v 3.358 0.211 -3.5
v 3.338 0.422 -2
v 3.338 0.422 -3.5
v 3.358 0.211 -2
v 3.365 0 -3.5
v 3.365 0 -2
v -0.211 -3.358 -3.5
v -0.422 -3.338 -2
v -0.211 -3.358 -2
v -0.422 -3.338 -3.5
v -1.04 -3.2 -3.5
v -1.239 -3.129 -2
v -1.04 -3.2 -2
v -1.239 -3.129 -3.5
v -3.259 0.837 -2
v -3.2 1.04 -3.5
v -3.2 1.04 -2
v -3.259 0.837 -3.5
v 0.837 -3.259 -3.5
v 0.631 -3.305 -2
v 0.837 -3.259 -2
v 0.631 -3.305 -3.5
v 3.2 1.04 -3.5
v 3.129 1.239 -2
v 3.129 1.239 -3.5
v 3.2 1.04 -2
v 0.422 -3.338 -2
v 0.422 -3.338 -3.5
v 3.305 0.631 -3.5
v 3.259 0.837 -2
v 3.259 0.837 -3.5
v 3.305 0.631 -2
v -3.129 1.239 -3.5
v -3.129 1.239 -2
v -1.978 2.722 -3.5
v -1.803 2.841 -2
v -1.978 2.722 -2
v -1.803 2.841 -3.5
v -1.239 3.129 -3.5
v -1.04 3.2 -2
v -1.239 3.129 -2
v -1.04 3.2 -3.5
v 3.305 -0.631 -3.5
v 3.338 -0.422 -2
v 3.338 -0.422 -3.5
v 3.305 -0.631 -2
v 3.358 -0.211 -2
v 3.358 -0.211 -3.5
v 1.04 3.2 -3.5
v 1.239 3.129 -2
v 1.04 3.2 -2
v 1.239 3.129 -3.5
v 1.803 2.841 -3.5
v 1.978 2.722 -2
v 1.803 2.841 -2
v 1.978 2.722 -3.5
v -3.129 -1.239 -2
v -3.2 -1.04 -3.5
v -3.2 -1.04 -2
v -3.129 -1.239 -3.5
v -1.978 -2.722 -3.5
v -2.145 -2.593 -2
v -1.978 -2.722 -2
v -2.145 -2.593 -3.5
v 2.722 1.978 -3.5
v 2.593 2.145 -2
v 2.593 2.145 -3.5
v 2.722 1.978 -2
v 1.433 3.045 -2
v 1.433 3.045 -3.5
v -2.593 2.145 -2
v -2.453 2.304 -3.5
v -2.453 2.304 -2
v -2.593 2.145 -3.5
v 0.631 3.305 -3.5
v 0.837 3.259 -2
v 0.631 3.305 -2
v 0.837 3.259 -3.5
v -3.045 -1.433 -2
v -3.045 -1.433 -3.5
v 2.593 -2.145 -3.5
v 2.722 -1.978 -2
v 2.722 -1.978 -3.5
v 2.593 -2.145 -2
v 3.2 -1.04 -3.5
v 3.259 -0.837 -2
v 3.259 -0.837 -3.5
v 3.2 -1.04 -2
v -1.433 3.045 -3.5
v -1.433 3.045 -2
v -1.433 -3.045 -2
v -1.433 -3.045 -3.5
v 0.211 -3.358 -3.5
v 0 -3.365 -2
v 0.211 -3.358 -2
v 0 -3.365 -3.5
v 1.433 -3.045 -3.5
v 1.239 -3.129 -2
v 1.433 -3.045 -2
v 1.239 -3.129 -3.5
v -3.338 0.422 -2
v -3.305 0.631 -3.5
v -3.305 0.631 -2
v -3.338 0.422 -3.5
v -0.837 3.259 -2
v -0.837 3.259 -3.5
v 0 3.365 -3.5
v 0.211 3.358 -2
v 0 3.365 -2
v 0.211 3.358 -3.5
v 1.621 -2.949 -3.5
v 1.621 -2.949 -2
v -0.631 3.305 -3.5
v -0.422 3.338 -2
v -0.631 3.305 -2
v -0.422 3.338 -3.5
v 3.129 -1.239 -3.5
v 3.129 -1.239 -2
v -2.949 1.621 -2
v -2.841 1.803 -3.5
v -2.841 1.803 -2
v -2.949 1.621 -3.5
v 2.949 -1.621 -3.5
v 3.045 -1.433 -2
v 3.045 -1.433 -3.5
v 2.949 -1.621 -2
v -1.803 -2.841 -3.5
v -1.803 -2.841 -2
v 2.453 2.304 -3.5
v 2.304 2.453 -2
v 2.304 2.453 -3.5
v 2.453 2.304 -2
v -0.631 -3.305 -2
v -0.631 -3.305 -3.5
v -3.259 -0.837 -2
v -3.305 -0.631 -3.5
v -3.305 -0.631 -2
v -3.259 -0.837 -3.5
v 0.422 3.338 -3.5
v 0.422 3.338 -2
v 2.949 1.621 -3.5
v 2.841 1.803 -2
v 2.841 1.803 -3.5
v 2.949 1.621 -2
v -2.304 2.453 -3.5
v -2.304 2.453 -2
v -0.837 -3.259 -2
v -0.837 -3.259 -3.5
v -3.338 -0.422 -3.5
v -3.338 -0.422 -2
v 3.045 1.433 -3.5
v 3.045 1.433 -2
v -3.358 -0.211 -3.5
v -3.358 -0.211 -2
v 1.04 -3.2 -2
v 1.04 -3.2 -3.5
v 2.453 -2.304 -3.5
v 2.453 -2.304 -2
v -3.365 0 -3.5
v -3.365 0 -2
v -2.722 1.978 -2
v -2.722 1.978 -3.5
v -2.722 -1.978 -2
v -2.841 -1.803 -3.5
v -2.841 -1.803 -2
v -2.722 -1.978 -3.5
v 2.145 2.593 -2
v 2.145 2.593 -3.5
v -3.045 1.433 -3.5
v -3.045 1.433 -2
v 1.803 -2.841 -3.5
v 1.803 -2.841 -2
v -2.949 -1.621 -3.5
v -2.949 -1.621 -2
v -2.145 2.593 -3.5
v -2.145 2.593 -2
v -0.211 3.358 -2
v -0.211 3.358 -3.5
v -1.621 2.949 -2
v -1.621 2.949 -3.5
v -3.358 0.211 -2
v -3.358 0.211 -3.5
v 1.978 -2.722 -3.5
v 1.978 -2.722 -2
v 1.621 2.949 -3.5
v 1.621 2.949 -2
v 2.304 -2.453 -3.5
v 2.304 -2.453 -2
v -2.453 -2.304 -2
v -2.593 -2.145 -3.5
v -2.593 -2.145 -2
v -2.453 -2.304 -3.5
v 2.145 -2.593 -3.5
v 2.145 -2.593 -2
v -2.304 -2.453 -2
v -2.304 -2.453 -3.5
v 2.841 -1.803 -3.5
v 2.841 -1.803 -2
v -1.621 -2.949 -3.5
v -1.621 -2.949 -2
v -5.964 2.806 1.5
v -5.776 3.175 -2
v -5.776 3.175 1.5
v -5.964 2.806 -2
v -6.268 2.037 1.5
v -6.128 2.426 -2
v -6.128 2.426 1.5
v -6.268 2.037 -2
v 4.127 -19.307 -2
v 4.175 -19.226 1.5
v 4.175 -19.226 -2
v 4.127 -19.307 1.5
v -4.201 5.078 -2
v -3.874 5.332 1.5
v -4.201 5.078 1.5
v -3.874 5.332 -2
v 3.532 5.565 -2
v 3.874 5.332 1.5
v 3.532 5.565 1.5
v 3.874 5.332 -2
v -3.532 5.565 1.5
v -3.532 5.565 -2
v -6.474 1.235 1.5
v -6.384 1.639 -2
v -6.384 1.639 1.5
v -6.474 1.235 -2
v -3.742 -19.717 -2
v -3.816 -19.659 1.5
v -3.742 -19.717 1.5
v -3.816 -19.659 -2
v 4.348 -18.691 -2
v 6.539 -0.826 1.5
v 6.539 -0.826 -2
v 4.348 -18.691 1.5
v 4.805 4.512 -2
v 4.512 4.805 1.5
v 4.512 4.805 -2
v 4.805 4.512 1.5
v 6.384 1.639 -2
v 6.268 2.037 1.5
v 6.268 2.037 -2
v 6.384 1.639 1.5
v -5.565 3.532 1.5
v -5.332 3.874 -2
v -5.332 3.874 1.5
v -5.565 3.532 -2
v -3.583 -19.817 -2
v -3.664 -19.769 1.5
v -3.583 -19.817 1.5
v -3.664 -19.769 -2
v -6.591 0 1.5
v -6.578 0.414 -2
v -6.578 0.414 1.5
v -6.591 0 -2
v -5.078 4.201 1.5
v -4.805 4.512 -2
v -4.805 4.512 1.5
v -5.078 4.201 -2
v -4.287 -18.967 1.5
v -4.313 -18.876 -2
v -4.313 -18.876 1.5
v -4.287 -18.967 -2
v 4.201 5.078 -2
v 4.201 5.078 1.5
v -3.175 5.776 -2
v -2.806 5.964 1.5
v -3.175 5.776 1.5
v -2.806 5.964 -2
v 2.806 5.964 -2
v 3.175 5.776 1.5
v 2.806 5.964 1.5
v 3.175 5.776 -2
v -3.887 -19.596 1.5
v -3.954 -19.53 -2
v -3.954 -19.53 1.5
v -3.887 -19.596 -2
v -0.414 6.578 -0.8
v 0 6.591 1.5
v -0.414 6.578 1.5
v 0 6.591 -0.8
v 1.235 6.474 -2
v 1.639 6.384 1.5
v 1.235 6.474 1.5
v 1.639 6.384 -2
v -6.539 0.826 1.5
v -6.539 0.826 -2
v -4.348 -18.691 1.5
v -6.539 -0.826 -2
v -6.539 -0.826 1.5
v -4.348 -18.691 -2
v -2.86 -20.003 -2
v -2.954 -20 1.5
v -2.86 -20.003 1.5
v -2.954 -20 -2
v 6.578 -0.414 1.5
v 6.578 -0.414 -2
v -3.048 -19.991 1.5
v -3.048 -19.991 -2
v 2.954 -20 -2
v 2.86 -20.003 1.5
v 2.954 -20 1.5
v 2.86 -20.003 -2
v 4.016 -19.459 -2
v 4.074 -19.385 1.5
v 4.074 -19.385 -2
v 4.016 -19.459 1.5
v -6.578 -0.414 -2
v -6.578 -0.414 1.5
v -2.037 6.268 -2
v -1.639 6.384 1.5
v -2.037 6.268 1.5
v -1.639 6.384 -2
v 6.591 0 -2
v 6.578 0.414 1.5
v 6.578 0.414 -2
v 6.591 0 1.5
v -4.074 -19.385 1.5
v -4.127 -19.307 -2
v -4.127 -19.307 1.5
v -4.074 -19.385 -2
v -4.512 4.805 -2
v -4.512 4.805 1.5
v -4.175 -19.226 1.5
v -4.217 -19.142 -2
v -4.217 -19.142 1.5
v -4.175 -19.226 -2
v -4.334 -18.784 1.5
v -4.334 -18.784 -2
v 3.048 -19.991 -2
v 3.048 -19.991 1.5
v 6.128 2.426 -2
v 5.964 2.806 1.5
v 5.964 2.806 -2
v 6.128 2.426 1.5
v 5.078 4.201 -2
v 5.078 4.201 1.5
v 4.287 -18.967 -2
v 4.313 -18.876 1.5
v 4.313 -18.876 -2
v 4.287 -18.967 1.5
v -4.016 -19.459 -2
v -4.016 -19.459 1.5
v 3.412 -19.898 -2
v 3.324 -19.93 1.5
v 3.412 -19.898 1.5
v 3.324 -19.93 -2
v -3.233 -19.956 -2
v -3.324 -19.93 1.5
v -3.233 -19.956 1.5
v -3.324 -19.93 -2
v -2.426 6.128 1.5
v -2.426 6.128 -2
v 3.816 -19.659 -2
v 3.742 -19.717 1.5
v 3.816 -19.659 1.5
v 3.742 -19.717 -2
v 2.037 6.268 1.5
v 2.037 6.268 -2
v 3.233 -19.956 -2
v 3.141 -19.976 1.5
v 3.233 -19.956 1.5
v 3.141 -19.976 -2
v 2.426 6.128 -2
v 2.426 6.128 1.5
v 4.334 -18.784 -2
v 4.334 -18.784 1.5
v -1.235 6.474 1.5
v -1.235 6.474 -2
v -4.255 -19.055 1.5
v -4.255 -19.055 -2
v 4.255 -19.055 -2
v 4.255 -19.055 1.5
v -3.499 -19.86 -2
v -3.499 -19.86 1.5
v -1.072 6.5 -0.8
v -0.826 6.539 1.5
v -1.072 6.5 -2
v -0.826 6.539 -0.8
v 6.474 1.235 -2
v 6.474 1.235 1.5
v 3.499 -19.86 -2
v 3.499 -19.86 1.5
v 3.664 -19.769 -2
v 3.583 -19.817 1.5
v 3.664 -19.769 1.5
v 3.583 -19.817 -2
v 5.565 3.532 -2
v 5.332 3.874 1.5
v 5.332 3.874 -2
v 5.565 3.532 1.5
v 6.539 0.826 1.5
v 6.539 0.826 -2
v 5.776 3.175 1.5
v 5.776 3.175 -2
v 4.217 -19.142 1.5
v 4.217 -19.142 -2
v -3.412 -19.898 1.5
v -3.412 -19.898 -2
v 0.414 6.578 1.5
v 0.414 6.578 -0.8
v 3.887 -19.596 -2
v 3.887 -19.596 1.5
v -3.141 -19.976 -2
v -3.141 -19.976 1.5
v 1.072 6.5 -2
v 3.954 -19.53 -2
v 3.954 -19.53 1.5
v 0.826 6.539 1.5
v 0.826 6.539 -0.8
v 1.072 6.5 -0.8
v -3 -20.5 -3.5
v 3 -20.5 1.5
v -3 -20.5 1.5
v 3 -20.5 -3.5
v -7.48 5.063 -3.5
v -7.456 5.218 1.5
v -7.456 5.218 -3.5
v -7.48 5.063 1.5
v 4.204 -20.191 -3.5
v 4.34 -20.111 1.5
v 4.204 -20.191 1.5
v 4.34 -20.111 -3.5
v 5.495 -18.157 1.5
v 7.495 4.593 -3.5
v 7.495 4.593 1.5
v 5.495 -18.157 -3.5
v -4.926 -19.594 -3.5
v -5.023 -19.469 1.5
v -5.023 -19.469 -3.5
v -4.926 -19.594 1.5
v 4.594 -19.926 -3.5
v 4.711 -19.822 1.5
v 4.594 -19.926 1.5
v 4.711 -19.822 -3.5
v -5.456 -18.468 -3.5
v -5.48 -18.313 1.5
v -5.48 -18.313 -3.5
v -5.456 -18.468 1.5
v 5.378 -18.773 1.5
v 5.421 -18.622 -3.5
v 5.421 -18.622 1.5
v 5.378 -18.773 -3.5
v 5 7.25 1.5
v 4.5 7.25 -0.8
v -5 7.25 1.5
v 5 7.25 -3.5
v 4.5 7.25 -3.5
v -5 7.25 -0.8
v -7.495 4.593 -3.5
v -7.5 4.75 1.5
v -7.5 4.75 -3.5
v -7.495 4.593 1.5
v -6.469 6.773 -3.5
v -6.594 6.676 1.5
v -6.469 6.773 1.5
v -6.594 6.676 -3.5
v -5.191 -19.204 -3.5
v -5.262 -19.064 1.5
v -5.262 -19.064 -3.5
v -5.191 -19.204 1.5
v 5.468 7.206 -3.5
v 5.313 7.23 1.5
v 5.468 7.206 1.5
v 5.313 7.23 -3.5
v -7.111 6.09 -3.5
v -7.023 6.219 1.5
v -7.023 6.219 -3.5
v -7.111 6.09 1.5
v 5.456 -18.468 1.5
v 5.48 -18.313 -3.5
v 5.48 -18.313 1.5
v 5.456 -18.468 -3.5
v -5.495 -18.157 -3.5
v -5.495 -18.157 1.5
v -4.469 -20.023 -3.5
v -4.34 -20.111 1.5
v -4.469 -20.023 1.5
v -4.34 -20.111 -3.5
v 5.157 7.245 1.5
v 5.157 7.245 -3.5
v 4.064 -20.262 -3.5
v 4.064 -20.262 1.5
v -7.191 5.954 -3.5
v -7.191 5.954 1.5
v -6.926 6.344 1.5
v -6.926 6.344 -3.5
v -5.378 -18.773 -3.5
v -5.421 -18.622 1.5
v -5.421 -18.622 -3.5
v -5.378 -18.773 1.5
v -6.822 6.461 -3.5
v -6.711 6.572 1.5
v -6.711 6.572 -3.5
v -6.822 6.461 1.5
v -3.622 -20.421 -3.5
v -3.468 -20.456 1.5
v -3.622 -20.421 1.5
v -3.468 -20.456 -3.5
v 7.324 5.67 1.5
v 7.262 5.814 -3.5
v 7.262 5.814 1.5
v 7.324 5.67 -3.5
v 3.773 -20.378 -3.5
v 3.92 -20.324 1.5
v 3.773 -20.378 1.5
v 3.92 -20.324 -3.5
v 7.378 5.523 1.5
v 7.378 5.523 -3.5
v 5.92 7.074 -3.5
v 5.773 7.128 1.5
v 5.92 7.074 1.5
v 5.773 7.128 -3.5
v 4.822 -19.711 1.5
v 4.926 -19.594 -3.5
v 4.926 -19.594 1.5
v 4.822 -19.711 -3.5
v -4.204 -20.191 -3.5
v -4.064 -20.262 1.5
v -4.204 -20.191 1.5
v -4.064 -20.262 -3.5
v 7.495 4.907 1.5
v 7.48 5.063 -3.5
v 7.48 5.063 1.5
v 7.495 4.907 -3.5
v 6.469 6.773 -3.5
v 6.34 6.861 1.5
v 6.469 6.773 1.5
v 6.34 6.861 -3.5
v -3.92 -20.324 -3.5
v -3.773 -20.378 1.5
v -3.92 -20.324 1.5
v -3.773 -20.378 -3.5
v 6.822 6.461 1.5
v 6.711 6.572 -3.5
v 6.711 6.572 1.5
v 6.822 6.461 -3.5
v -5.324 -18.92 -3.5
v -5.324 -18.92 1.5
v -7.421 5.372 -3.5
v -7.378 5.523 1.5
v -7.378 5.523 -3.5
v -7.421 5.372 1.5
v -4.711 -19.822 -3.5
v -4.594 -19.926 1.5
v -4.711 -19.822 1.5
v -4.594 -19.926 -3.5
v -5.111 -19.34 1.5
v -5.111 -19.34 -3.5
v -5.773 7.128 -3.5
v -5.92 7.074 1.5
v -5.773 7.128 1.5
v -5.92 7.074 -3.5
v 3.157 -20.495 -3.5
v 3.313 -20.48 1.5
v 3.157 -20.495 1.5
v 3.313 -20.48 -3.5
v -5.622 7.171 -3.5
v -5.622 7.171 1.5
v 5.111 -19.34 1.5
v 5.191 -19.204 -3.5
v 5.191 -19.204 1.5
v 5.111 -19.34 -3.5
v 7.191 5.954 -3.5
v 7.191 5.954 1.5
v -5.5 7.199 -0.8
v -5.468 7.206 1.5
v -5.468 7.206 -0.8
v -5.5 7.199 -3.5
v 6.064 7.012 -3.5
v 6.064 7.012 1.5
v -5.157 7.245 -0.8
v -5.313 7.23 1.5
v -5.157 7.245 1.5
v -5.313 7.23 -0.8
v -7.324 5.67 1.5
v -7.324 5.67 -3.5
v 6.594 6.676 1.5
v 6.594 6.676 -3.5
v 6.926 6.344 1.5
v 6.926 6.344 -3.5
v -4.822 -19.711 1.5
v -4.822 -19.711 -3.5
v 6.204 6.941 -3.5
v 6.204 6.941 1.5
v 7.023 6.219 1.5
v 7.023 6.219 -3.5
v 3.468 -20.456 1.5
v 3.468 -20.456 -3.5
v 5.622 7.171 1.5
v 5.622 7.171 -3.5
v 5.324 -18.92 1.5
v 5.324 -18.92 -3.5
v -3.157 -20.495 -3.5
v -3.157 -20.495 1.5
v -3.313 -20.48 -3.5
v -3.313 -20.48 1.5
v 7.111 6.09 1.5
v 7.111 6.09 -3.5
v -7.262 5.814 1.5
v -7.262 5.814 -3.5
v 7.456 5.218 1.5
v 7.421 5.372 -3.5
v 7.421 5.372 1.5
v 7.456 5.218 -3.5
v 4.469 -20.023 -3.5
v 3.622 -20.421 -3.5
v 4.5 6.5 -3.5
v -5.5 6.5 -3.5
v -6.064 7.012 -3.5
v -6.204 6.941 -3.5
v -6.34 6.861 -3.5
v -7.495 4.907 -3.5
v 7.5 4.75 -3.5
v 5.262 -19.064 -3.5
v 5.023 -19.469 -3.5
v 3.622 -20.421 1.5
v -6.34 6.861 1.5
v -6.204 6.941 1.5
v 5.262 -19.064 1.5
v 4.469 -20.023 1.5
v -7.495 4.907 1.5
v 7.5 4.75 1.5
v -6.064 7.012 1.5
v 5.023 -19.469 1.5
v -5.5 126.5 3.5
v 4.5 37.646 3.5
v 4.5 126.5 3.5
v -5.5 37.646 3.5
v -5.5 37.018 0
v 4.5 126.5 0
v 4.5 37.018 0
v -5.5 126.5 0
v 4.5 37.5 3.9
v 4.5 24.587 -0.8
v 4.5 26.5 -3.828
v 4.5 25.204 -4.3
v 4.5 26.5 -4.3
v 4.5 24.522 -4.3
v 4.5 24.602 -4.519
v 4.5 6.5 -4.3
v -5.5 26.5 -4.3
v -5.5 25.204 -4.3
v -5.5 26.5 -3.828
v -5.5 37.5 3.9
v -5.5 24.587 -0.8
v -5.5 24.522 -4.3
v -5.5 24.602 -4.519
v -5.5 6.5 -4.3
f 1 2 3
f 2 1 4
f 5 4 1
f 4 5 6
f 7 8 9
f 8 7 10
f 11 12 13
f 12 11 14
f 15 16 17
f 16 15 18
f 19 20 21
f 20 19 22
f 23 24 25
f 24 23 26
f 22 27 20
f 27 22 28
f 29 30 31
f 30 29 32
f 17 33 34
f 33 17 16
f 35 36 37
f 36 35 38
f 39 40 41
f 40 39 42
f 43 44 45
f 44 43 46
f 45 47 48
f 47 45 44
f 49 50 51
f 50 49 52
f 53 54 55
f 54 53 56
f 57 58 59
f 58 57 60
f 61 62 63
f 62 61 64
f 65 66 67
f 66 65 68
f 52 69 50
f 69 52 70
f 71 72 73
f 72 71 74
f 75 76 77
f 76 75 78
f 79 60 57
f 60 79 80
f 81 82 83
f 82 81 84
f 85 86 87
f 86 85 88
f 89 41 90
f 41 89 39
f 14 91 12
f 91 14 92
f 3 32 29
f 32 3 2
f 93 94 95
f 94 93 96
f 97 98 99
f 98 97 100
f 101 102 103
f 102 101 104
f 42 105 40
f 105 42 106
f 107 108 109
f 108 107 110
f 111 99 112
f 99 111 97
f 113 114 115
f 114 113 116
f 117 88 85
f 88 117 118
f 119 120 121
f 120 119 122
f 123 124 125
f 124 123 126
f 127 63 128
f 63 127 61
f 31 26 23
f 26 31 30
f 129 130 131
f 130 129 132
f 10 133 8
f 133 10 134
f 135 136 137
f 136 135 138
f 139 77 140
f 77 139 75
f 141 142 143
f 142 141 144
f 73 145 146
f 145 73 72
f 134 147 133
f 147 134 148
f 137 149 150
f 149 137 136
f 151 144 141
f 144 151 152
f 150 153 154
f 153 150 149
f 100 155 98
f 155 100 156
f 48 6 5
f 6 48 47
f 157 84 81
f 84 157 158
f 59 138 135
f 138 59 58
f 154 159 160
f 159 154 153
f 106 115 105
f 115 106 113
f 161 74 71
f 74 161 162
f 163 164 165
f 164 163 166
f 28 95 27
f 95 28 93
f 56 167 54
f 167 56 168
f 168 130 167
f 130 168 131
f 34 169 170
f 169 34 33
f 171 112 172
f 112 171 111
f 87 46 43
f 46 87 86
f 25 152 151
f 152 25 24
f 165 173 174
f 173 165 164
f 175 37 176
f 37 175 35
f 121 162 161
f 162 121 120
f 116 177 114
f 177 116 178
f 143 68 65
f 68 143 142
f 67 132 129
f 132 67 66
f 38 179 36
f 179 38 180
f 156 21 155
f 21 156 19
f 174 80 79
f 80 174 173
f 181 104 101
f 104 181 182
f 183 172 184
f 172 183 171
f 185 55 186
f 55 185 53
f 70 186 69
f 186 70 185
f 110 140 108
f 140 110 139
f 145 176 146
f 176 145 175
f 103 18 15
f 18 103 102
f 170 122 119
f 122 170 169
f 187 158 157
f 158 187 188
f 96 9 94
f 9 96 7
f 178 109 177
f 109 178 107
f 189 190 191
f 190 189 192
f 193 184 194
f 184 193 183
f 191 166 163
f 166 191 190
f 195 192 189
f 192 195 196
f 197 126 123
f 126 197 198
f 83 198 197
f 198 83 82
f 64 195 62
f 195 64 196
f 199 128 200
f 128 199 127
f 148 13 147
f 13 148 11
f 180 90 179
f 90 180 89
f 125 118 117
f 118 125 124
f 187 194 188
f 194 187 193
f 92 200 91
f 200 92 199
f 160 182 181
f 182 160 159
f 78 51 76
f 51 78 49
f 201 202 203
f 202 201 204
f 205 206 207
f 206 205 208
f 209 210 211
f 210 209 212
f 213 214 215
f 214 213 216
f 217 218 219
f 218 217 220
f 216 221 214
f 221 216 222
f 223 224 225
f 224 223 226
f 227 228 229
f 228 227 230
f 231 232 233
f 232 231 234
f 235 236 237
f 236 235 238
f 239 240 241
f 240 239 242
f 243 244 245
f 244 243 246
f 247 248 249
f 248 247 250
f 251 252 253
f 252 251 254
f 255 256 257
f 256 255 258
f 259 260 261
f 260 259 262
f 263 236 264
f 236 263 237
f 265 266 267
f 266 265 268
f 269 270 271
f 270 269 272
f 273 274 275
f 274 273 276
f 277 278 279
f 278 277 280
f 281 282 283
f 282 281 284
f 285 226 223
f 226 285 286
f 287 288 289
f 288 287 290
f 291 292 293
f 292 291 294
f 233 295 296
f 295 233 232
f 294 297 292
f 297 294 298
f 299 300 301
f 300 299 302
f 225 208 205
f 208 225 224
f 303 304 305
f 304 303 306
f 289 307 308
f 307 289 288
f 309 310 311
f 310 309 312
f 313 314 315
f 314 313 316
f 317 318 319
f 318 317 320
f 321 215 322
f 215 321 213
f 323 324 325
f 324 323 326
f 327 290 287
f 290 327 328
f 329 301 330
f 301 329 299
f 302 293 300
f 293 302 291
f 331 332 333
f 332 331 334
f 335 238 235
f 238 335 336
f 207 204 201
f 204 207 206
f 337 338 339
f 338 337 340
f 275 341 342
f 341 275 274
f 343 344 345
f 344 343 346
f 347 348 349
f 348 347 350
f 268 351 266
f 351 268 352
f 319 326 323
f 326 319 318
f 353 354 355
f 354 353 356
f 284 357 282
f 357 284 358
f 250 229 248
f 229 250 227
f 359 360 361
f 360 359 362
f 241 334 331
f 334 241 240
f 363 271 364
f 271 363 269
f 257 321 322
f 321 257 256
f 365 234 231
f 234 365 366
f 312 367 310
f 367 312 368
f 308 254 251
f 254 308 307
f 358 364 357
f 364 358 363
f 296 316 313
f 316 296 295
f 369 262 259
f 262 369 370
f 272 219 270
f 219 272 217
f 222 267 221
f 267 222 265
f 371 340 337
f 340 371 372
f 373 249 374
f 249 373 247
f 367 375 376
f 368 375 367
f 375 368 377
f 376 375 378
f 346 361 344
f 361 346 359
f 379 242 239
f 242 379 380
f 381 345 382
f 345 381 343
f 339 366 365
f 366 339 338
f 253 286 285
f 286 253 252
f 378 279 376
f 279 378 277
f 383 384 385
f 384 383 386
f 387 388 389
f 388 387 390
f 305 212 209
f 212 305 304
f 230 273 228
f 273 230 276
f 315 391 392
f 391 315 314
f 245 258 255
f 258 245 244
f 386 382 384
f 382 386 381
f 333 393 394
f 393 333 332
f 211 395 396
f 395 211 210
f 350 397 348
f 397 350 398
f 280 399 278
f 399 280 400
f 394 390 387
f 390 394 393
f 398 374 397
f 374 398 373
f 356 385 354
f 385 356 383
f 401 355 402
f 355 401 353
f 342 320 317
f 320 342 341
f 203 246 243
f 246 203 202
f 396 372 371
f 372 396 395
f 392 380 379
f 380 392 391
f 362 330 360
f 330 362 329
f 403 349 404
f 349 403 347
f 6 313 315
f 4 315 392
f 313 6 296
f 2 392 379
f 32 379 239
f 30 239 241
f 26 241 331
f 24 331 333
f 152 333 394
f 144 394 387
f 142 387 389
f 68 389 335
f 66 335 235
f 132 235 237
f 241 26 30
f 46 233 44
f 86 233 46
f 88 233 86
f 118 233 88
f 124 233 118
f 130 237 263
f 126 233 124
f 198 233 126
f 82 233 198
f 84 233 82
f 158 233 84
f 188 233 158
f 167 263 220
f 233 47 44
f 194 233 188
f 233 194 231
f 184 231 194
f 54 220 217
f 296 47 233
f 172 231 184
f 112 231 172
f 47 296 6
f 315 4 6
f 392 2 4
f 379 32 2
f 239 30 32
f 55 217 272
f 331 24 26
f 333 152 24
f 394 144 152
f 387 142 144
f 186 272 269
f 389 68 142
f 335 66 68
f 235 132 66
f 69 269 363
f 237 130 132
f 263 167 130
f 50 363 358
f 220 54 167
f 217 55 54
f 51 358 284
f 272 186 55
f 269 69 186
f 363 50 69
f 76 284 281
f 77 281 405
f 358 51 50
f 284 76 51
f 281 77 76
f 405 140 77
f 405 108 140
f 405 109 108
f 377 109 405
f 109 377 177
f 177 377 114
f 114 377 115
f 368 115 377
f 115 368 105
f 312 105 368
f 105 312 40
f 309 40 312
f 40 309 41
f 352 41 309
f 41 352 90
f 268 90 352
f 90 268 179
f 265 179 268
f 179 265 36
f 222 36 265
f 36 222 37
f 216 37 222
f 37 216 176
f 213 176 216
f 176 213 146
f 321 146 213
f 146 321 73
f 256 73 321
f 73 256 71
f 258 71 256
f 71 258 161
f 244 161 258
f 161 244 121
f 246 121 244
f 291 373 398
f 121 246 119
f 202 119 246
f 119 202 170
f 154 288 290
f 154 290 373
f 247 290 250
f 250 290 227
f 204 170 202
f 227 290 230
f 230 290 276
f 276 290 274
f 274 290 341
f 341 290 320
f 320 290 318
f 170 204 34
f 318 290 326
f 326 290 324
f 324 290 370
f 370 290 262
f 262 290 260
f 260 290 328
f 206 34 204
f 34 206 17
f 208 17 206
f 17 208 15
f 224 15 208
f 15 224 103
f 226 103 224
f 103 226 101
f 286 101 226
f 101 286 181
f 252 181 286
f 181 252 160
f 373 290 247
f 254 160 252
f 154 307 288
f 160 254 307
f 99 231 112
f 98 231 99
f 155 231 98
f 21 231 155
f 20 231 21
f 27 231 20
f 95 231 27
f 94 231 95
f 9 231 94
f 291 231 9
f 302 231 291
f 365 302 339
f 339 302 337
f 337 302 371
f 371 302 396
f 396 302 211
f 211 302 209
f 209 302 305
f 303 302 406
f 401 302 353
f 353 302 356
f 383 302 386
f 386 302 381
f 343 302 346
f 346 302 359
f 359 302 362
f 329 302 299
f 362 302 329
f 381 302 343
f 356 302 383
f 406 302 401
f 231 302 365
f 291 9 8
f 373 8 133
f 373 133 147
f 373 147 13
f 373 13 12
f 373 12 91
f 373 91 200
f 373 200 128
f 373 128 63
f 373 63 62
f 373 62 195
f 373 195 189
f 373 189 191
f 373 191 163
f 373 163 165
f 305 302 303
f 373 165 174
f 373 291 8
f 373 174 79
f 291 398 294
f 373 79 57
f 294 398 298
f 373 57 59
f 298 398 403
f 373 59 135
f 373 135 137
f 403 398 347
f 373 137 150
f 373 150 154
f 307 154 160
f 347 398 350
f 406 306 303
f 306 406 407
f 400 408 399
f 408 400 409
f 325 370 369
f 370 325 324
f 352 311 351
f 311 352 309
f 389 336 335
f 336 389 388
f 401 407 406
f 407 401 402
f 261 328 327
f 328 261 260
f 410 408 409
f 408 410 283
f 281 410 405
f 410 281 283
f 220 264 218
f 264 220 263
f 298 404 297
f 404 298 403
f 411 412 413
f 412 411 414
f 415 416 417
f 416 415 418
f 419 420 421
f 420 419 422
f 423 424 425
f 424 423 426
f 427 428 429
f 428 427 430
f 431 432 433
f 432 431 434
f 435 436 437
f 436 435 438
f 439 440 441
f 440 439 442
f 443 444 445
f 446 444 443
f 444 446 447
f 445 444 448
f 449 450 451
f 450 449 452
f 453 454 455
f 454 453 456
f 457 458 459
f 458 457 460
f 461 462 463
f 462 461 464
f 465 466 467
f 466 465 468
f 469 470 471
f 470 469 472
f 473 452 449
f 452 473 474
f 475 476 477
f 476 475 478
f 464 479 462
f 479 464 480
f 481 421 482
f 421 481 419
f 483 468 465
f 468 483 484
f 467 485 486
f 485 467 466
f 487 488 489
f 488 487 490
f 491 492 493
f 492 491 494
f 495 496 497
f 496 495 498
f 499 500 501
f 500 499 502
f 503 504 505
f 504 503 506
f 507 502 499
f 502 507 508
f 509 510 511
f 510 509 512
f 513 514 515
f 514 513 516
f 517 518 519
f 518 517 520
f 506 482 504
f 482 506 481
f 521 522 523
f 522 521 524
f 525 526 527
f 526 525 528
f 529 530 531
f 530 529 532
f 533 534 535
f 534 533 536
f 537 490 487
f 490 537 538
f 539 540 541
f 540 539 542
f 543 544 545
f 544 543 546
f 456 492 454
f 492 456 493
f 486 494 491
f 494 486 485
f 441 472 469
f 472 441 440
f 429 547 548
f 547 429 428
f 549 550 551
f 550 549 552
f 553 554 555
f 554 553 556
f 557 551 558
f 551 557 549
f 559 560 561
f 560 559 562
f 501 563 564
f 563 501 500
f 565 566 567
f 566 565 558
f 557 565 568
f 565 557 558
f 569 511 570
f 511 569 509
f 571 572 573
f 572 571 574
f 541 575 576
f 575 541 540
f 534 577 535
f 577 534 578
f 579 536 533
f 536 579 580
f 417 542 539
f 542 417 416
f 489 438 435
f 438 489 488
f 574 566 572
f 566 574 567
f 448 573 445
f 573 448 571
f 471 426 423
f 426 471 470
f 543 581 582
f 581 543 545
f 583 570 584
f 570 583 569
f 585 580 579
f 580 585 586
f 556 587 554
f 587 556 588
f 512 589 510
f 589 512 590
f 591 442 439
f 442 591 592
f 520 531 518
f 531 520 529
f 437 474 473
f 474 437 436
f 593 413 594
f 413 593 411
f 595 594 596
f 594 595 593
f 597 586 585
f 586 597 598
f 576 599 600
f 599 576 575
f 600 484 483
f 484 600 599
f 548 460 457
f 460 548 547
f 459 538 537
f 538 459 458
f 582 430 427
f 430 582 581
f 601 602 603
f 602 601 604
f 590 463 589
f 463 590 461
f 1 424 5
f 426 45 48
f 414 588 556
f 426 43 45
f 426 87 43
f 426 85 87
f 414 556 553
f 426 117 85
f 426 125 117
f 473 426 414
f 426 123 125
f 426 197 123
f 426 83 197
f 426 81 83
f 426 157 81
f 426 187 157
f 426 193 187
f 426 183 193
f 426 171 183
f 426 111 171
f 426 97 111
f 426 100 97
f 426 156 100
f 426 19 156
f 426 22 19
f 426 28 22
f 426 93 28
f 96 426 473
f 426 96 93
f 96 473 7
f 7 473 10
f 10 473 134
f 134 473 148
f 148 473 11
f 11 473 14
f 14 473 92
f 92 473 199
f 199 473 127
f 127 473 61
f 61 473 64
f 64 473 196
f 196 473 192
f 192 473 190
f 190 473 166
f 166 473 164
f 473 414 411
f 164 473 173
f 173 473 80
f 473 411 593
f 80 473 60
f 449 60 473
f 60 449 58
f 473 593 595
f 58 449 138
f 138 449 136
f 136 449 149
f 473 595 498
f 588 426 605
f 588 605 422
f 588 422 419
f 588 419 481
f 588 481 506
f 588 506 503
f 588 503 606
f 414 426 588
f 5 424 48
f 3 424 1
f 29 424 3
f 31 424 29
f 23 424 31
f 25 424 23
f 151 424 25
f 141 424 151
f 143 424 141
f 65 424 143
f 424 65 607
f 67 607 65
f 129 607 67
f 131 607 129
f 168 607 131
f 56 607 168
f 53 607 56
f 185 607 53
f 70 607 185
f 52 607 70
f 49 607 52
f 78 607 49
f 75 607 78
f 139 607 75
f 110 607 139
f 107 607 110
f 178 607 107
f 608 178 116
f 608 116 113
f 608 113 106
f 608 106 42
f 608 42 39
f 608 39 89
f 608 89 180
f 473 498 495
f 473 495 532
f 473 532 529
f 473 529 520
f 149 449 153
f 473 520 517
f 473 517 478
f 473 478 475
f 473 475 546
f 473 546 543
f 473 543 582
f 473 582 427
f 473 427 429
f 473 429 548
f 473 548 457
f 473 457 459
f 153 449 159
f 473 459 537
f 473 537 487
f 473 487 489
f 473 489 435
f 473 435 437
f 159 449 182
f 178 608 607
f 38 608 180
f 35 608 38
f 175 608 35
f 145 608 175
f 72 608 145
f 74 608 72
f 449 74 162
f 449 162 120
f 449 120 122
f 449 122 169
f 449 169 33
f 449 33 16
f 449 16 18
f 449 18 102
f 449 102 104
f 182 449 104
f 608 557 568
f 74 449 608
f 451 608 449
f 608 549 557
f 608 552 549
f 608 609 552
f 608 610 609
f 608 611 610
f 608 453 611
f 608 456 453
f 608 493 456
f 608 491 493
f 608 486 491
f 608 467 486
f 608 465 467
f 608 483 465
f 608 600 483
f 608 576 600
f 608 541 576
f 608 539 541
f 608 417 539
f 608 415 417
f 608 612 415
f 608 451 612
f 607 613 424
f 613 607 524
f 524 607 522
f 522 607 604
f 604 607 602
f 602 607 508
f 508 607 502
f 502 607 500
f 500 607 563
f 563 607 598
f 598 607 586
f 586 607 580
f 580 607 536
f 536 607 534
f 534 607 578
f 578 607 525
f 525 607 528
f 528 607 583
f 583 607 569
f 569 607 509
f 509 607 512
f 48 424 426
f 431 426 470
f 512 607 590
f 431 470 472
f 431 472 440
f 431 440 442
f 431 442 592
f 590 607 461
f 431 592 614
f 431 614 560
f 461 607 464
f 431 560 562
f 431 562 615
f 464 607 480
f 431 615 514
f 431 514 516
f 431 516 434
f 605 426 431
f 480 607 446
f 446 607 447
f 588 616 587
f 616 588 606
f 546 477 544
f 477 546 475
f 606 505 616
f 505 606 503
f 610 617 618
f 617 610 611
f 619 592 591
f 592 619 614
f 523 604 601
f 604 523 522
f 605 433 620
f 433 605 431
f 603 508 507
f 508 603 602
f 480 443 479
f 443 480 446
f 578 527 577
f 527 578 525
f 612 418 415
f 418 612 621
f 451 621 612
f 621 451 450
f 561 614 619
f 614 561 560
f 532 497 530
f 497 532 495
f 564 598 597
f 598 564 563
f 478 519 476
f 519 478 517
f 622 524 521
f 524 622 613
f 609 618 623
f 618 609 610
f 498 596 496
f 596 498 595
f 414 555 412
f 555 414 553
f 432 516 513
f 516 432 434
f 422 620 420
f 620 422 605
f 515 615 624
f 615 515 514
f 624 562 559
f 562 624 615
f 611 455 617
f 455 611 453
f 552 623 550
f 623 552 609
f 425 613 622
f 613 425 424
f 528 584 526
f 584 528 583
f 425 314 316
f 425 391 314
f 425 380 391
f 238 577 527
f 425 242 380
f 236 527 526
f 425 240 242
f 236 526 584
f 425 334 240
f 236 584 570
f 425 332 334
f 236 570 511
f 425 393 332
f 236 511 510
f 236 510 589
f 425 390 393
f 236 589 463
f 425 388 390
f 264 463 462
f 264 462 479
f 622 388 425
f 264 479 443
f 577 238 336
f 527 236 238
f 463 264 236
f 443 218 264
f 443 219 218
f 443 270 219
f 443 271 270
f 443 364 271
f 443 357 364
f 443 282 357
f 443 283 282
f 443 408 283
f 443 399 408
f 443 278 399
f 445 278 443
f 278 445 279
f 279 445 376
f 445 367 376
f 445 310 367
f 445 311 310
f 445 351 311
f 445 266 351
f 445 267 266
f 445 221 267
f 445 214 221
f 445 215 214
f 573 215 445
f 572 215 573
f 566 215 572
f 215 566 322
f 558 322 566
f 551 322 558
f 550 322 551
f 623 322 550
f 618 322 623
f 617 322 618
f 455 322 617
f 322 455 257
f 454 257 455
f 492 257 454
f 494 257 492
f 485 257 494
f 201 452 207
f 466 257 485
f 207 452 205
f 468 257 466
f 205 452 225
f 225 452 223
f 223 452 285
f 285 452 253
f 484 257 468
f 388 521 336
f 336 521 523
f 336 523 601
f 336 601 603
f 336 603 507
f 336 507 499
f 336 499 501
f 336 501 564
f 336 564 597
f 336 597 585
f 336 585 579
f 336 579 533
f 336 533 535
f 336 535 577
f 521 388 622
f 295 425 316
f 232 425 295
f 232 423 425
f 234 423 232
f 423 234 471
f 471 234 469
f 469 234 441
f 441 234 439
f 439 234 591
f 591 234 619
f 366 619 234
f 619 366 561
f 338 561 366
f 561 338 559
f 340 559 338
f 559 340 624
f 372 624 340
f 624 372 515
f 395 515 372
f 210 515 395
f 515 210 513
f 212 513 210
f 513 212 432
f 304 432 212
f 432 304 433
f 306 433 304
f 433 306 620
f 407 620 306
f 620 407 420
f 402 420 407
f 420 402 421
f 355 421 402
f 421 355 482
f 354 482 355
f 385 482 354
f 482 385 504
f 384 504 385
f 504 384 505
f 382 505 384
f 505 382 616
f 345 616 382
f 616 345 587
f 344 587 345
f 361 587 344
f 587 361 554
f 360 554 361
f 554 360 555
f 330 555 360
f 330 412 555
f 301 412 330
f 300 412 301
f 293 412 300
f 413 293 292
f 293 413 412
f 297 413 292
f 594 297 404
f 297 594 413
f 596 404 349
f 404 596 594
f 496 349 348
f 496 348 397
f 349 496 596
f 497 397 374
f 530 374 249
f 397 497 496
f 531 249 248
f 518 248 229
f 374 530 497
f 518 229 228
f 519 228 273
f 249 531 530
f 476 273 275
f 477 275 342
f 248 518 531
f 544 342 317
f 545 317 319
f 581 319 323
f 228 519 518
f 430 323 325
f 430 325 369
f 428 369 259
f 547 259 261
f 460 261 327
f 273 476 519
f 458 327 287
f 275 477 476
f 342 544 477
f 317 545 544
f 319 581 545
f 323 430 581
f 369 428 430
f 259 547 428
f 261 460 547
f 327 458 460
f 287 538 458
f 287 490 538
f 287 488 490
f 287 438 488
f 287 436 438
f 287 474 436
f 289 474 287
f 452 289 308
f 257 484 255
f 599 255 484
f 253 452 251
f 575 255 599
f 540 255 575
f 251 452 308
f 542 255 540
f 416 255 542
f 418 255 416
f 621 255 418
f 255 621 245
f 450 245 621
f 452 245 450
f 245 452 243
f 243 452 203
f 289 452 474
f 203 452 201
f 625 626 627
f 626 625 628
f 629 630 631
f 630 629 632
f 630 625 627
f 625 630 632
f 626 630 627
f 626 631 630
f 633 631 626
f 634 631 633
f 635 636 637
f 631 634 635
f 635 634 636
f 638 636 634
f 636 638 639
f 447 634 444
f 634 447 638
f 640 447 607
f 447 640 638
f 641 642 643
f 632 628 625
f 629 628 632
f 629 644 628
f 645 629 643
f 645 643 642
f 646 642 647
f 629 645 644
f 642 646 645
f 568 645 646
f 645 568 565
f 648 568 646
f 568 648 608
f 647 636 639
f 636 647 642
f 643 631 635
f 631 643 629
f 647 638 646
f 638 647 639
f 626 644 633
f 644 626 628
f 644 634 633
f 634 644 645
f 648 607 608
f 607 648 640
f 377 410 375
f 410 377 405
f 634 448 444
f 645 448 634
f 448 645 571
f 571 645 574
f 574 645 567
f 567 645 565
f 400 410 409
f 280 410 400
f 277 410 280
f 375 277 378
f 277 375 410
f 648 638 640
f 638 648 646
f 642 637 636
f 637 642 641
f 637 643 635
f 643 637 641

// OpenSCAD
// file: insertPostive.scad
//CS474 Final Project Module
//Stephen Stucky, Sam Chuks, Josh Pritchett
//Units in MM

//This is the positive of the toothbrush insert
//Subtract this to get a space the insert can fit into

module insertPositive() {
	//center cylinder tab thing-a-majig
	translate([0,0,-2]){
		cylinder(8, r=3.3650, center=true);
	}
	
	hull() {
		hull() {
			translate([2.8602, -18.5030, 0]) {
				cylinder(4, r=1.5, center=true);
			}

			translate([-2.8602, -18.5030, 0]) {
				cylinder(4, r=1.5, center=true);
			}
		}

		cylinder(4, r=6.5910, center=true);
	}
	
} 
// file: brushSlot.scad
//CS474 3D Printing
//Final Project
//Stephen Stucky, Sam Chuks, Joshua Pritchett

include <insertPostive.scad>

$fn = 100;

module brushSlot() {

difference() {
	hull() {
		hull() {
			translate([5,4.75,-1]) {
				cylinder(5, d=5, center=true);
			}

			translate([-5,4.75,-1]) {
				cylinder(5, d=5, center=true);
			}
		}

		hull() {
			translate([-3,-18,-1]) {
				cylinder(5, d=5, center=true);
			}

			translate([3,-18,-1]) {
				cylinder(5, d=5, center=true);
			}	
		}
	}

	insertPositive();
}




//	difference() {
	//	translate([0,-7,-1]) {
		//	cube([14,28,5], center=true);
		//}

		//translate([6.75,5.75,-3]) {
			//cylinder(6, d=4);
		//}

		//insertPositive();
	//}


}

brushSlot();
// main file
include <brushSlot.scad>
brushSlot();
translate([-5.5,126.5,0]){
rotate([0,0,-90]){
cube([90,10,3.5]);
	translate([89,0,3.9]){
		rotate([0,110,0]){
			cube([3.5,10,15]);
		};
	};
translate([100,0,-4.3]){
cube([20,10,3.5]);
};
};
};
